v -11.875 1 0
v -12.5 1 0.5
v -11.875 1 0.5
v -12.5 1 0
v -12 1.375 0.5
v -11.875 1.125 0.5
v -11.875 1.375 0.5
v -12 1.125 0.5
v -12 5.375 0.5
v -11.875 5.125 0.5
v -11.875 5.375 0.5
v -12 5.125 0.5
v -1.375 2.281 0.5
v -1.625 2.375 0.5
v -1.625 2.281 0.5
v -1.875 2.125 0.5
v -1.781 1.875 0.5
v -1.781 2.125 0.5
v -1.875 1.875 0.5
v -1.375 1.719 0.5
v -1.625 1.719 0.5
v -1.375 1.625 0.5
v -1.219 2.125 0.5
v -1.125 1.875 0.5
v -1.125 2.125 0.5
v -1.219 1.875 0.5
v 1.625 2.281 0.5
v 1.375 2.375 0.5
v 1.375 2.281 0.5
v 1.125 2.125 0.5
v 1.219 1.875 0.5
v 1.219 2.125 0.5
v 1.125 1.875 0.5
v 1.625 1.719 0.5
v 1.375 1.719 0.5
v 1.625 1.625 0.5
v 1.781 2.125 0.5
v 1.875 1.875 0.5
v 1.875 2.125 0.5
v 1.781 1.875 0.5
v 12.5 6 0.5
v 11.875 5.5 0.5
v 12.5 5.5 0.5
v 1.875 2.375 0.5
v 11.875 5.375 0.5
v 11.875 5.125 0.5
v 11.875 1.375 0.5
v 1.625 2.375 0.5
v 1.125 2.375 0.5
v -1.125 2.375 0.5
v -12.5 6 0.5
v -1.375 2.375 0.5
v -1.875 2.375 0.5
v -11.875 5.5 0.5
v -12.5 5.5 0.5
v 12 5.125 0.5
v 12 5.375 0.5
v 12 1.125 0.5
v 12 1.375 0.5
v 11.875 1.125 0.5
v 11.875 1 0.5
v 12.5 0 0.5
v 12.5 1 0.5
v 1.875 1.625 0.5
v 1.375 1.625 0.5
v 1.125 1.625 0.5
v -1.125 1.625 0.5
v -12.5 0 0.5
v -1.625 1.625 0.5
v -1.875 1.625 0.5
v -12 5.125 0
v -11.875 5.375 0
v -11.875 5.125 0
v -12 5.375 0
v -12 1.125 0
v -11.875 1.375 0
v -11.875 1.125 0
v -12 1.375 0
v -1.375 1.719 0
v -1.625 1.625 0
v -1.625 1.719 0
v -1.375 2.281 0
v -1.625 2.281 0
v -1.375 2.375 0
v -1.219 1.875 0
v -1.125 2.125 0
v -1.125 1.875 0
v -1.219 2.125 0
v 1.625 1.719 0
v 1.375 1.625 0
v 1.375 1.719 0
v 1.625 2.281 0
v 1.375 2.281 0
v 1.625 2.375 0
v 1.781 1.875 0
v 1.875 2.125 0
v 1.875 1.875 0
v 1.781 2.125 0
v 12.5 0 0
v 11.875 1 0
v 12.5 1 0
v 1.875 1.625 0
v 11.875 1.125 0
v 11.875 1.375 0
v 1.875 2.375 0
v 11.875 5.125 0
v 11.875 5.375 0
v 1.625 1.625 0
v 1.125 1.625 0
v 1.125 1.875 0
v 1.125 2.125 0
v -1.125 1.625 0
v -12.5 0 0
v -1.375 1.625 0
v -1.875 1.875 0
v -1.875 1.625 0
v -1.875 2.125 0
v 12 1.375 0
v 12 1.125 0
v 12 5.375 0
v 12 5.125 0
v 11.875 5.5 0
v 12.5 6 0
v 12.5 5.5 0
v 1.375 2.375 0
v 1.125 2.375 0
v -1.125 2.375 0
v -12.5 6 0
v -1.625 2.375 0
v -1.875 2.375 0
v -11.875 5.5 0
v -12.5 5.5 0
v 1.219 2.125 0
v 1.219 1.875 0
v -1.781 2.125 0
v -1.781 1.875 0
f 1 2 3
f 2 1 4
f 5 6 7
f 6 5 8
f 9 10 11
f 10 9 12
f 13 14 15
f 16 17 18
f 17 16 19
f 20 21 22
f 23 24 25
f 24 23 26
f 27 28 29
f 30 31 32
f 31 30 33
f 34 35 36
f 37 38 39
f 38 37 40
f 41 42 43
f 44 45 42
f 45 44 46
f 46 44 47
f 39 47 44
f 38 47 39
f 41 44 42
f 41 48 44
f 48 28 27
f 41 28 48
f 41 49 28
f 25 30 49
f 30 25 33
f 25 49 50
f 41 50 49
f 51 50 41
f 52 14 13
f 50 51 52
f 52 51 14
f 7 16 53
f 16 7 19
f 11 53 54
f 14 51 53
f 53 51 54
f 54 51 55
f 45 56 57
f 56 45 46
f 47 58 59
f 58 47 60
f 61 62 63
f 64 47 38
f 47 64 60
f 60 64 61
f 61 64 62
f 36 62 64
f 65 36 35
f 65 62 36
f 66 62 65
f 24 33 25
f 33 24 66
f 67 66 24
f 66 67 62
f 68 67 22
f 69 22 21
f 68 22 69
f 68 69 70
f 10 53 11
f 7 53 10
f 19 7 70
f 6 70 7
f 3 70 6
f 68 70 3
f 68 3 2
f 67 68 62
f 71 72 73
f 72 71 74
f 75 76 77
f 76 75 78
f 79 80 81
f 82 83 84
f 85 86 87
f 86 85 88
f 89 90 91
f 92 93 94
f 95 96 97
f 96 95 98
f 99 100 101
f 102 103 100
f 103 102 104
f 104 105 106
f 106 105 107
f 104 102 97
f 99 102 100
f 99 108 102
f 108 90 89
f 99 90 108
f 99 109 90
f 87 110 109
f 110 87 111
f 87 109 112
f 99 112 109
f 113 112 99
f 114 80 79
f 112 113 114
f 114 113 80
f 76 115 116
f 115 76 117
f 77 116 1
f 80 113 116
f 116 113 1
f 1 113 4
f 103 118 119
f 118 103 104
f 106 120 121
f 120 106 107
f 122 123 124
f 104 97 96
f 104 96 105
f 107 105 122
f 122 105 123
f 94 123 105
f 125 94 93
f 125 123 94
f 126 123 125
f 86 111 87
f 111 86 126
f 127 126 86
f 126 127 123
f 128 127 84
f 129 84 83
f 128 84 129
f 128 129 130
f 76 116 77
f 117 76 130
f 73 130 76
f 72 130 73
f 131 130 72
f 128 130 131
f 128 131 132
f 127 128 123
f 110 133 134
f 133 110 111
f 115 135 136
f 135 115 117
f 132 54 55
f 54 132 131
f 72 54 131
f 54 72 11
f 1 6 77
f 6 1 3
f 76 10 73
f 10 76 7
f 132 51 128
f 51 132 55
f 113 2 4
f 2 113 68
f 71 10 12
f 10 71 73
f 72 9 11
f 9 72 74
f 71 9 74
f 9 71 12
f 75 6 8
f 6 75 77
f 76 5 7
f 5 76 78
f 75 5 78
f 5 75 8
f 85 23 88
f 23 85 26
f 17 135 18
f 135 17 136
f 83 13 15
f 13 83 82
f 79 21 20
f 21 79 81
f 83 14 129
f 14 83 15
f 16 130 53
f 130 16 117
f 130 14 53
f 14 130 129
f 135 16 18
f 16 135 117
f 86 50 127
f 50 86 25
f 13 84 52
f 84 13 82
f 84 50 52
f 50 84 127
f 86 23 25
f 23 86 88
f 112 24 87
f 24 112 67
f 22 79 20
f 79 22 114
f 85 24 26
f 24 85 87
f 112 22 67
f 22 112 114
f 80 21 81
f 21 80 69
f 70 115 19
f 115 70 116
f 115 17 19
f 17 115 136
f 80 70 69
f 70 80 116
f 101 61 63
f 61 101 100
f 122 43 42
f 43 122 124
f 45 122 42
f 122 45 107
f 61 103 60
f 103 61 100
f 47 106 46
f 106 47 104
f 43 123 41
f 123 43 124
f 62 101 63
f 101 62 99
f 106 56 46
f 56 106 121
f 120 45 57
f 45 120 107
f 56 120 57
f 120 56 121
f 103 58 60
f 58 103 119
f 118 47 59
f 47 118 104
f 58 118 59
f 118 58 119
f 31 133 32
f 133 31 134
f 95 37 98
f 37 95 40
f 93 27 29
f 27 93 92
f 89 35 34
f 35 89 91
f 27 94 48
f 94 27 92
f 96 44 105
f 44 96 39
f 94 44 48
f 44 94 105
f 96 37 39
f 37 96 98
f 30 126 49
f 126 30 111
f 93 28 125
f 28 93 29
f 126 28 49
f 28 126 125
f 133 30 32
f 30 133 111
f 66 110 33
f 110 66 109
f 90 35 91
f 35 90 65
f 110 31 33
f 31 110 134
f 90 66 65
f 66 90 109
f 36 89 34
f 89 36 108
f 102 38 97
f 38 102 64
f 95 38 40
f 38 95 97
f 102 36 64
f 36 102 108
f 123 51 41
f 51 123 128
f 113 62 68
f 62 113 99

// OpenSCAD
// file: modus.scad
//Corner Joint - allows the sides of two parts to create inlayed corner. Aids with welding.
//need to verify module math is the same throughout all parts.

module cornerjoint(Z,L,H,EndGap,PadL,PadH,CJangle,CJcenter){
    //change so that H = Z of inlayed part (usually 0.5)
    //add center and angle in degrees option, orgin far side of cut out area

     if((CJangle==0)&&(CJcenter==0))
      {    
        translate([0,0,0])
        rotate([0,0,CJangle])
        difference(){
        cube([L,H+PadH,Z]);
        translate([EndGap,H,0])
        cube([PadL,PadH,Z]);
        translate([L-EndGap-PadL,H,0])
        cube([PadL,PadH,Z]);}
      }    
else if((CJangle==90)&&(CJcenter==0))
      {    
        translate([H+PadH,0,0])
        rotate([0,0,CJangle])
        difference(){
        cube([L,H+PadH,Z]);
        translate([EndGap,H,0])
        cube([PadL,PadH,Z]);
        translate([L-EndGap-PadL,H,0])
        cube([PadL,PadH,Z]);}
      }
else if((CJangle==180)&&(CJcenter==0))       
      {    
        translate([L,H+PadH,0])
        rotate([0,0,CJangle])
        difference(){
        cube([L,H+PadH,Z]);
        translate([EndGap,H,0])
        cube([PadL,PadH,Z]);
        translate([L-EndGap-PadL,H,0])
        cube([PadL,PadH,Z]);}
      }
else if((CJangle==270)&&(CJcenter==0))
      {    
        translate([0,L,0])
        rotate([0,0,CJangle])
        difference(){
        cube([L,H+PadH,Z]);
        translate([EndGap,H,0])
        cube([PadL,PadH,Z]);
        translate([L-EndGap-PadL,H,0])
        cube([PadL,PadH,Z]);}
      }  
      
//centered     
   
else if((CJangle==0)&&(CJcenter==1))
      {    
        translate([-L/2,0,0])
        rotate([0,0,CJangle])
        difference(){
        cube([L,H+PadH,Z]);
        translate([EndGap,H,0])
        cube([PadL,PadH,Z]);
        translate([L-EndGap-PadL,H,0])
        cube([PadL,PadH,Z]);}
      }  
else if((CJangle==90)&&(CJcenter==1))
      {    
        translate([0,-L/2,0])
        rotate([0,0,CJangle])
        difference(){
        cube([L,H+PadH,Z]);
        translate([EndGap,H,0])
        cube([PadL,PadH,Z]);
        translate([L-EndGap-PadL,H,0])
        cube([PadL,PadH,Z]);}
      }
else if((CJangle==180)&&(CJcenter==1))       
      {    
        translate([L/2,0,0])
        rotate([0,0,CJangle])
        difference(){
        cube([L,H+PadH,Z]);
        translate([EndGap,H,0])
        cube([PadL,PadH,Z]);
        translate([L-EndGap-PadL,H,0])
        cube([PadL,PadH,Z]);}
      }
else if((CJangle==270)&&(CJcenter==1))
      {    
        translate([0,L/2,0])
        rotate([0,0,CJangle])
        difference(){
        cube([L,H+PadH,Z]);
        translate([EndGap,H,0])
        cube([PadL,PadH,Z]);
        translate([L-EndGap-PadL,H,0])
        cube([PadL,PadH,Z]);}
      }
} //end cornerjoint module

//Tab Insert - used to cut a hole for an abutting part to insert into. Typically aids with welding the two parts.
module tabinsert(X,Y,Z,dGap,cGap,c1,c2,c3,c4,c5,c6,c7,c8,center){
    translate([-dGap-(center*(X/2)),-dGap-(center*(Y/2)),0]){
        //main cut
        cube([X+(dGap*2),Y+(dGap*2),Z]);
        //corner c1c2
        translate([-cGap,(Y+(dGap*2))-c1+cGap,0])
            {
        cube([c2,c1,Z]);}
       //corner c3c4
       translate([(X+(dGap*2))-c3+cGap,(Y+(dGap*2))-c4+cGap,0]){
           cube([c3,c4,Z]);
       }
       //corner c5c6
       translate([(X+(dGap*2))-c6+cGap,-cGap,0])
      {
          cube([c6,c5,Z]);
      }
       
       //corner c7c8 
       translate([-cGap,-cGap,0]){
           cube([c7,c8,Z]);
       }
    
    } //end center translate
} //end tabinsert module
 

module nut(flattoflat,nutheight){  //distance from one flat side to the other flat side "A/F"

//typical sizes found here:
//https://en.wikipedia.org/wiki/Nut_(hardware)

difference(){
    translate([0,0,nutheight/2])
cube(size = [10,10,nutheight], center = true);
    
for(i=[1:6]){
    rotate([0,0,i*60])
difference(){
    translate([-10,0,0])
    cube([20,20,nutheight]);
    translate([-10,0,0])
    cube([20,flattoflat/2,nutheight]);
}  //end difference
}  //end for
}  //end differeence
}  //end module
// file: vars.scad
brickW=6; 
brickL=24;
brickCH=6; //Is brick height being shortened by d1z??

//3.625 x 2.25 x 8
//6 x 12 x 6

grateX=56;
grateY=23;
grateH=37; //Height mounted above press's frame
grateA=17.5; //angle of grate

//grateX=56;
//grateY=23;
//grateH=37; //Height mounted above press's frame
//grateA=17.5; //angle of grate


$fn=8; //defines resolution of circles. 8 is okay for review. 100  or greater should be used for for final dxf export.

dZstandard=0.5; //thickness of steel to be cut for drawer parts
fZstandard=0.5;
aZstandard=0.5; //thickness of steel to be cut for arm parts
hZstandard=0.125;

fBOLTHOLEstandardD=1; //standard bolts used on frame
aBOLTHOLEstandardD=1;

sliderodholeOD=1.2; 
d1bushingOD=1.25;
d1bushingL=1.25;
d1shaftOD=1;
d1bolt1OD=1;
d1bolt2OD=0.75;
d1nut2AF=1.25;
d1nut2H=0.665;


dGap=0.03125; //gap between a hole cut's edge and the part sitting within the hole. //D3 appears to use 0.3125, is this in error?

//all parts set to standard thickness below
//off standard preferences can be defined below

//drawer
drawergap=0.0283;  //extra room for drawer to slide in the space between f1 and f4
drawerHgap=0.1884;  //total extra space from drawer sides to frame walls. sum of both sides.

d2clevispinaccessholeOD=3;

d1z=dZstandard;
d2z=dZstandard;
d3z=dZstandard;
d4z=dZstandard;
d5z=dZstandard;
d6z=dZstandard;
d5z=dZstandard;
d7z=dZstandard;
d8z=dZstandard;
d9z=dZstandard;

d11z=dZstandard;
d12z=dZstandard;


//frame

f1y=6;
f1z=fZstandard;


f2y=3.5;
f2z=fZstandard;

f3y=3.5;
f3z=fZstandard;

f4y=11;
f4z=fZstandard;

f5y=3.5;
f5z=fZstandard;

f6y=8;
f6z=fZstandard;

f8y=brickW;
f8z=fZstandard;
f8boltD=1;

f9y=4.5;

f9z=fZstandard;




f12z=fZstandard;   

f11x=1.25;
f11z=fZstandard;

f13z=fZstandard;

f14y=3.5;
f14z=fZstandard;

//arms

a1x=4;
a1z=aZstandard;
a1out=24; //length from frame to A5 edge for bricks to sit on as they exit

a2x=6;
a2z=aZstandard;

a3x=4;
a3y=72;
a3z=aZstandard;

a4x=6;
a4y=72;
a4z=aZstandard;

a5x=6;
a5y=72;
a5z=aZstandard;

a6z=aZstandard;

//guards

h1x=grateX;
h1y=grateH;  //might need to tweak for grate thickness

h1z=hZstandard;
h2z=hZstandard;
h3z=hZstandard;
h4z=hZstandard;
h5z=hZstandard;
h6z=hZstandard;
h7z=hZstandard;
h8z=hZstandard;

//
//Input your main cylinder's dimenions here
//
cylMainBore = 5;
cylMainStroke = 16;
cylMainExt = 43;
cylMainRet = 27;
cylMainA = (cylMainRet-cylMainStroke); //center to center minus stroke length
cylMainB = 0.25; // cylinder wall thickness
cylMainD = 2.5; //Rod OD
cylMainE = 5.75; //rear pin holder width
cylMainG = 4; //rod pin holder width
cylMainJ = 3.8; //distance from the end of the cylinder body to rod pin center
cylMainR = 1.52; //pin hole ID
cylMainS = 2.5; //pin holder OD

//
//Input your drawer cylinder's dimenions here
//
//
cylDrawerBore = 5;
cylDrawerStroke = 16;
cylDrawerExt = 43;
cylDrawerRet = 27;
cylDrawerA = (cylMainRet-cylMainStroke); //center to center minus stroke length
cylDrawerB = 0.25; // cylinder wall thickness
cylDrawerD = 2.5; //Rod OD
cylDrawerE = 5.75; //rear pin holder width
cylDrawerG = 4; //rod pin holder width
cylDrawerJ = 3.8; //distance from the end of the cylinder body to rod pin center
cylDrawerR = 1.52; //pin hole ID
cylDrawerS = 2.5; //pin holder OD

cylinderDRAWERbodyH=3; //measured when in position, largest length from top to bottom of cylinder
cylinderDRAWERminC2C=0; //drawer's hydraulic cylinder's distance from the center of one mounting hole to the center of the other when fully compressed.
cylinderDRAWERmaxC2C=0; ///drawer's hydraulic cylinder's distance from the center of one mounting hole to the center of the other when fully extended.
cylinderDRAWERrodclevisW=2.5; //width of cylinders' clevis on end of rod
cylinderDRAWERrodclevisID=1;
cylinderDRAWERrodclevisOD=2;
cylinderDRAWERrearclevisW=2.5; //width of mounting clevis cylinder body
cylinderDRAWERrearclevisID=1;
cylinderDRAWERrearclevisOD=2;
cylinderDRAWERrearclevisClearance=3; //usable space around rear clevis pin (in diameter). be aware of hyraulic fittings.

//the following variables are calculated in order of dependence on preceding variables

d3x=brickL+(d2z*2);
d3y=brickCH-d1z;
d4x=brickW+d3z+d3z;
d4y=brickCH-d1z;
d5x=brickL+(d2z*2);
d5y=brickW;
d6x=brickL+(d2z*2);
d6y=brickCH;
d7x=cylinderDRAWERrearclevisClearance;
d7y=a4z+d8z+cylinderDRAWERbodyH;
d9x=cylinderDRAWERbodyH+d6z; //should be based on clevis size?
d9y=cylinderDRAWERbodyH+d8z;
d8x=brickL+(d2z*2);
d8y=max(5,(d9x-d6z));   //need to review fundamentals, 5 minimun unless d9 gets larger than d8
d11x=1.5+(d1bolt1OD*2)+d1bushingOD;
d11y=max((0.5+d1bushingL),4);

d12x=d8x;
d12y=d11y+1;

f1x=((brickL+(d2z*2)+drawerHgap+(f9y*2)));
f3x=f1x;

d1x=(brickL+d2z+d2z);
//d1x=(((f1x/2)-(((brickL+(d2z*2)+drawerHgap)/2)-fZstandard-(sliderodholeOD/2)))+(d11x/2))*2;
d1y=((brickW+d3z+d3z)*3)+1;

d2x=d8y+d6z+brickW+d3z+d5y+d3z;
d2y=brickCH;



f11y=f8y;
f6x=brickL+(d2z*2)+(f9y*2)+drawerHgap;

f9x=(f2z+((cylMainS+0.125)/2)+cylMainRet-cylMainJ+1+f4y+drawergap+d2y+f1y);  //leaves 1" between top of cylinder and bottom of F4
f8x=f9x;


f2x=brickL+(d2z*2)+drawerHgap+(f9y*2)-(1.4*2);  //distance between large cut outs in f9

f5x=brickL+(d2z*2)+drawerHgap+(f9y*2)+(a1x*2); //distance between outer edges of each A1

f4x=f5x-0.5;   //same as f5 but minus 0.25 on each side to give a little overhang

f14x=brickL+(1*2)+(.125*2)+(dGap*2); 

f12x=f3x;
f12y=(f3y*2)+brickW;

sliderodoffset=(((brickL+(d2z*2)+drawerHgap)/2)-fZstandard-(sliderodholeOD/2));

distancetof8center=(cylDrawerExt+(a4x/2)+((d9x-d6z)/2)+d6z+(brickW/2)); //F8 center on A1

a1y=distancetof8center+(brickW/2)+a1out;
a2y=a1y;

h7x=f5x-((a1x/2)*2)+(1.5*2);
h7y=cylDrawerStroke;

h8x=f5x-((a1x/2)*2)+(1.5*2);
h8y=a1out-a5x-f5y;  //distance between a5 and f5

hopperBaseX=brickL;
hopperBaseY=brickW;

h2x=grateX;
h2y=sqrt(((h1y-(sin(grateA)*grateY))*(h1y-(sin(grateA)*grateY)))+(((cos(grateA)*grateY)-hopperBaseY)*((cos(grateA)*grateY)-hopperBaseY)));

//h1y-(sin(grateA)*grateY)
//(cos(grateA)*grateY)-hopperBaseY

echo(h1y-(sin(grateA)*grateY));
echo((cos(grateA)*grateY)-hopperBaseY);
echo(h2y);
echo(atan((h1y-(sin(grateA)*grateY))/((cos(grateA)*grateY)-hopperBaseY)));
echo((h1y-(sin(grateA)*grateY))/(h1y));

// ECHO - REQUIRED PARTS BASED ON INPUTS

echo(str("Minimum drawer cylinder stroke length: ",(d3z*2)+d5y+brickW));
//would be cool to validate and confirm user inputed stroke length. set error=1; if drawer cylinder is not long enough. print an echo warning.

echo(str("Grate hieght above ground level: ",(1)));
// main file
include <vars.scad>;
use <modus.scad>;

d6p();

module d6p(){


difference(){
translate([-(d6x/2),0,0])
cube([d6x,d6y,d6z]);
translate([-(d6x/2),0,0])
cuts();
translate([(d6x/2),0,0])
mirror([1,0,0])
cuts();
} //end difference

module cuts(){
    translate([0,1,0])
    cornerjoint(d6z,d6y-1-0.5,d2z,0.125,0.25,0.125,270,0);
    
    translate([(((d6x-cylinderDRAWERrodclevisW)/2)-(d9z/2)),((d9y-d8z)/2)+d8z,0])  
    tabinsert(d9z,0.5,d5z,0.03125,0.09375,0.25,0.25,0.25,0.25,0.25,0.25,0.25,0.25,1);
} //end cuts module

} //end d6p module
